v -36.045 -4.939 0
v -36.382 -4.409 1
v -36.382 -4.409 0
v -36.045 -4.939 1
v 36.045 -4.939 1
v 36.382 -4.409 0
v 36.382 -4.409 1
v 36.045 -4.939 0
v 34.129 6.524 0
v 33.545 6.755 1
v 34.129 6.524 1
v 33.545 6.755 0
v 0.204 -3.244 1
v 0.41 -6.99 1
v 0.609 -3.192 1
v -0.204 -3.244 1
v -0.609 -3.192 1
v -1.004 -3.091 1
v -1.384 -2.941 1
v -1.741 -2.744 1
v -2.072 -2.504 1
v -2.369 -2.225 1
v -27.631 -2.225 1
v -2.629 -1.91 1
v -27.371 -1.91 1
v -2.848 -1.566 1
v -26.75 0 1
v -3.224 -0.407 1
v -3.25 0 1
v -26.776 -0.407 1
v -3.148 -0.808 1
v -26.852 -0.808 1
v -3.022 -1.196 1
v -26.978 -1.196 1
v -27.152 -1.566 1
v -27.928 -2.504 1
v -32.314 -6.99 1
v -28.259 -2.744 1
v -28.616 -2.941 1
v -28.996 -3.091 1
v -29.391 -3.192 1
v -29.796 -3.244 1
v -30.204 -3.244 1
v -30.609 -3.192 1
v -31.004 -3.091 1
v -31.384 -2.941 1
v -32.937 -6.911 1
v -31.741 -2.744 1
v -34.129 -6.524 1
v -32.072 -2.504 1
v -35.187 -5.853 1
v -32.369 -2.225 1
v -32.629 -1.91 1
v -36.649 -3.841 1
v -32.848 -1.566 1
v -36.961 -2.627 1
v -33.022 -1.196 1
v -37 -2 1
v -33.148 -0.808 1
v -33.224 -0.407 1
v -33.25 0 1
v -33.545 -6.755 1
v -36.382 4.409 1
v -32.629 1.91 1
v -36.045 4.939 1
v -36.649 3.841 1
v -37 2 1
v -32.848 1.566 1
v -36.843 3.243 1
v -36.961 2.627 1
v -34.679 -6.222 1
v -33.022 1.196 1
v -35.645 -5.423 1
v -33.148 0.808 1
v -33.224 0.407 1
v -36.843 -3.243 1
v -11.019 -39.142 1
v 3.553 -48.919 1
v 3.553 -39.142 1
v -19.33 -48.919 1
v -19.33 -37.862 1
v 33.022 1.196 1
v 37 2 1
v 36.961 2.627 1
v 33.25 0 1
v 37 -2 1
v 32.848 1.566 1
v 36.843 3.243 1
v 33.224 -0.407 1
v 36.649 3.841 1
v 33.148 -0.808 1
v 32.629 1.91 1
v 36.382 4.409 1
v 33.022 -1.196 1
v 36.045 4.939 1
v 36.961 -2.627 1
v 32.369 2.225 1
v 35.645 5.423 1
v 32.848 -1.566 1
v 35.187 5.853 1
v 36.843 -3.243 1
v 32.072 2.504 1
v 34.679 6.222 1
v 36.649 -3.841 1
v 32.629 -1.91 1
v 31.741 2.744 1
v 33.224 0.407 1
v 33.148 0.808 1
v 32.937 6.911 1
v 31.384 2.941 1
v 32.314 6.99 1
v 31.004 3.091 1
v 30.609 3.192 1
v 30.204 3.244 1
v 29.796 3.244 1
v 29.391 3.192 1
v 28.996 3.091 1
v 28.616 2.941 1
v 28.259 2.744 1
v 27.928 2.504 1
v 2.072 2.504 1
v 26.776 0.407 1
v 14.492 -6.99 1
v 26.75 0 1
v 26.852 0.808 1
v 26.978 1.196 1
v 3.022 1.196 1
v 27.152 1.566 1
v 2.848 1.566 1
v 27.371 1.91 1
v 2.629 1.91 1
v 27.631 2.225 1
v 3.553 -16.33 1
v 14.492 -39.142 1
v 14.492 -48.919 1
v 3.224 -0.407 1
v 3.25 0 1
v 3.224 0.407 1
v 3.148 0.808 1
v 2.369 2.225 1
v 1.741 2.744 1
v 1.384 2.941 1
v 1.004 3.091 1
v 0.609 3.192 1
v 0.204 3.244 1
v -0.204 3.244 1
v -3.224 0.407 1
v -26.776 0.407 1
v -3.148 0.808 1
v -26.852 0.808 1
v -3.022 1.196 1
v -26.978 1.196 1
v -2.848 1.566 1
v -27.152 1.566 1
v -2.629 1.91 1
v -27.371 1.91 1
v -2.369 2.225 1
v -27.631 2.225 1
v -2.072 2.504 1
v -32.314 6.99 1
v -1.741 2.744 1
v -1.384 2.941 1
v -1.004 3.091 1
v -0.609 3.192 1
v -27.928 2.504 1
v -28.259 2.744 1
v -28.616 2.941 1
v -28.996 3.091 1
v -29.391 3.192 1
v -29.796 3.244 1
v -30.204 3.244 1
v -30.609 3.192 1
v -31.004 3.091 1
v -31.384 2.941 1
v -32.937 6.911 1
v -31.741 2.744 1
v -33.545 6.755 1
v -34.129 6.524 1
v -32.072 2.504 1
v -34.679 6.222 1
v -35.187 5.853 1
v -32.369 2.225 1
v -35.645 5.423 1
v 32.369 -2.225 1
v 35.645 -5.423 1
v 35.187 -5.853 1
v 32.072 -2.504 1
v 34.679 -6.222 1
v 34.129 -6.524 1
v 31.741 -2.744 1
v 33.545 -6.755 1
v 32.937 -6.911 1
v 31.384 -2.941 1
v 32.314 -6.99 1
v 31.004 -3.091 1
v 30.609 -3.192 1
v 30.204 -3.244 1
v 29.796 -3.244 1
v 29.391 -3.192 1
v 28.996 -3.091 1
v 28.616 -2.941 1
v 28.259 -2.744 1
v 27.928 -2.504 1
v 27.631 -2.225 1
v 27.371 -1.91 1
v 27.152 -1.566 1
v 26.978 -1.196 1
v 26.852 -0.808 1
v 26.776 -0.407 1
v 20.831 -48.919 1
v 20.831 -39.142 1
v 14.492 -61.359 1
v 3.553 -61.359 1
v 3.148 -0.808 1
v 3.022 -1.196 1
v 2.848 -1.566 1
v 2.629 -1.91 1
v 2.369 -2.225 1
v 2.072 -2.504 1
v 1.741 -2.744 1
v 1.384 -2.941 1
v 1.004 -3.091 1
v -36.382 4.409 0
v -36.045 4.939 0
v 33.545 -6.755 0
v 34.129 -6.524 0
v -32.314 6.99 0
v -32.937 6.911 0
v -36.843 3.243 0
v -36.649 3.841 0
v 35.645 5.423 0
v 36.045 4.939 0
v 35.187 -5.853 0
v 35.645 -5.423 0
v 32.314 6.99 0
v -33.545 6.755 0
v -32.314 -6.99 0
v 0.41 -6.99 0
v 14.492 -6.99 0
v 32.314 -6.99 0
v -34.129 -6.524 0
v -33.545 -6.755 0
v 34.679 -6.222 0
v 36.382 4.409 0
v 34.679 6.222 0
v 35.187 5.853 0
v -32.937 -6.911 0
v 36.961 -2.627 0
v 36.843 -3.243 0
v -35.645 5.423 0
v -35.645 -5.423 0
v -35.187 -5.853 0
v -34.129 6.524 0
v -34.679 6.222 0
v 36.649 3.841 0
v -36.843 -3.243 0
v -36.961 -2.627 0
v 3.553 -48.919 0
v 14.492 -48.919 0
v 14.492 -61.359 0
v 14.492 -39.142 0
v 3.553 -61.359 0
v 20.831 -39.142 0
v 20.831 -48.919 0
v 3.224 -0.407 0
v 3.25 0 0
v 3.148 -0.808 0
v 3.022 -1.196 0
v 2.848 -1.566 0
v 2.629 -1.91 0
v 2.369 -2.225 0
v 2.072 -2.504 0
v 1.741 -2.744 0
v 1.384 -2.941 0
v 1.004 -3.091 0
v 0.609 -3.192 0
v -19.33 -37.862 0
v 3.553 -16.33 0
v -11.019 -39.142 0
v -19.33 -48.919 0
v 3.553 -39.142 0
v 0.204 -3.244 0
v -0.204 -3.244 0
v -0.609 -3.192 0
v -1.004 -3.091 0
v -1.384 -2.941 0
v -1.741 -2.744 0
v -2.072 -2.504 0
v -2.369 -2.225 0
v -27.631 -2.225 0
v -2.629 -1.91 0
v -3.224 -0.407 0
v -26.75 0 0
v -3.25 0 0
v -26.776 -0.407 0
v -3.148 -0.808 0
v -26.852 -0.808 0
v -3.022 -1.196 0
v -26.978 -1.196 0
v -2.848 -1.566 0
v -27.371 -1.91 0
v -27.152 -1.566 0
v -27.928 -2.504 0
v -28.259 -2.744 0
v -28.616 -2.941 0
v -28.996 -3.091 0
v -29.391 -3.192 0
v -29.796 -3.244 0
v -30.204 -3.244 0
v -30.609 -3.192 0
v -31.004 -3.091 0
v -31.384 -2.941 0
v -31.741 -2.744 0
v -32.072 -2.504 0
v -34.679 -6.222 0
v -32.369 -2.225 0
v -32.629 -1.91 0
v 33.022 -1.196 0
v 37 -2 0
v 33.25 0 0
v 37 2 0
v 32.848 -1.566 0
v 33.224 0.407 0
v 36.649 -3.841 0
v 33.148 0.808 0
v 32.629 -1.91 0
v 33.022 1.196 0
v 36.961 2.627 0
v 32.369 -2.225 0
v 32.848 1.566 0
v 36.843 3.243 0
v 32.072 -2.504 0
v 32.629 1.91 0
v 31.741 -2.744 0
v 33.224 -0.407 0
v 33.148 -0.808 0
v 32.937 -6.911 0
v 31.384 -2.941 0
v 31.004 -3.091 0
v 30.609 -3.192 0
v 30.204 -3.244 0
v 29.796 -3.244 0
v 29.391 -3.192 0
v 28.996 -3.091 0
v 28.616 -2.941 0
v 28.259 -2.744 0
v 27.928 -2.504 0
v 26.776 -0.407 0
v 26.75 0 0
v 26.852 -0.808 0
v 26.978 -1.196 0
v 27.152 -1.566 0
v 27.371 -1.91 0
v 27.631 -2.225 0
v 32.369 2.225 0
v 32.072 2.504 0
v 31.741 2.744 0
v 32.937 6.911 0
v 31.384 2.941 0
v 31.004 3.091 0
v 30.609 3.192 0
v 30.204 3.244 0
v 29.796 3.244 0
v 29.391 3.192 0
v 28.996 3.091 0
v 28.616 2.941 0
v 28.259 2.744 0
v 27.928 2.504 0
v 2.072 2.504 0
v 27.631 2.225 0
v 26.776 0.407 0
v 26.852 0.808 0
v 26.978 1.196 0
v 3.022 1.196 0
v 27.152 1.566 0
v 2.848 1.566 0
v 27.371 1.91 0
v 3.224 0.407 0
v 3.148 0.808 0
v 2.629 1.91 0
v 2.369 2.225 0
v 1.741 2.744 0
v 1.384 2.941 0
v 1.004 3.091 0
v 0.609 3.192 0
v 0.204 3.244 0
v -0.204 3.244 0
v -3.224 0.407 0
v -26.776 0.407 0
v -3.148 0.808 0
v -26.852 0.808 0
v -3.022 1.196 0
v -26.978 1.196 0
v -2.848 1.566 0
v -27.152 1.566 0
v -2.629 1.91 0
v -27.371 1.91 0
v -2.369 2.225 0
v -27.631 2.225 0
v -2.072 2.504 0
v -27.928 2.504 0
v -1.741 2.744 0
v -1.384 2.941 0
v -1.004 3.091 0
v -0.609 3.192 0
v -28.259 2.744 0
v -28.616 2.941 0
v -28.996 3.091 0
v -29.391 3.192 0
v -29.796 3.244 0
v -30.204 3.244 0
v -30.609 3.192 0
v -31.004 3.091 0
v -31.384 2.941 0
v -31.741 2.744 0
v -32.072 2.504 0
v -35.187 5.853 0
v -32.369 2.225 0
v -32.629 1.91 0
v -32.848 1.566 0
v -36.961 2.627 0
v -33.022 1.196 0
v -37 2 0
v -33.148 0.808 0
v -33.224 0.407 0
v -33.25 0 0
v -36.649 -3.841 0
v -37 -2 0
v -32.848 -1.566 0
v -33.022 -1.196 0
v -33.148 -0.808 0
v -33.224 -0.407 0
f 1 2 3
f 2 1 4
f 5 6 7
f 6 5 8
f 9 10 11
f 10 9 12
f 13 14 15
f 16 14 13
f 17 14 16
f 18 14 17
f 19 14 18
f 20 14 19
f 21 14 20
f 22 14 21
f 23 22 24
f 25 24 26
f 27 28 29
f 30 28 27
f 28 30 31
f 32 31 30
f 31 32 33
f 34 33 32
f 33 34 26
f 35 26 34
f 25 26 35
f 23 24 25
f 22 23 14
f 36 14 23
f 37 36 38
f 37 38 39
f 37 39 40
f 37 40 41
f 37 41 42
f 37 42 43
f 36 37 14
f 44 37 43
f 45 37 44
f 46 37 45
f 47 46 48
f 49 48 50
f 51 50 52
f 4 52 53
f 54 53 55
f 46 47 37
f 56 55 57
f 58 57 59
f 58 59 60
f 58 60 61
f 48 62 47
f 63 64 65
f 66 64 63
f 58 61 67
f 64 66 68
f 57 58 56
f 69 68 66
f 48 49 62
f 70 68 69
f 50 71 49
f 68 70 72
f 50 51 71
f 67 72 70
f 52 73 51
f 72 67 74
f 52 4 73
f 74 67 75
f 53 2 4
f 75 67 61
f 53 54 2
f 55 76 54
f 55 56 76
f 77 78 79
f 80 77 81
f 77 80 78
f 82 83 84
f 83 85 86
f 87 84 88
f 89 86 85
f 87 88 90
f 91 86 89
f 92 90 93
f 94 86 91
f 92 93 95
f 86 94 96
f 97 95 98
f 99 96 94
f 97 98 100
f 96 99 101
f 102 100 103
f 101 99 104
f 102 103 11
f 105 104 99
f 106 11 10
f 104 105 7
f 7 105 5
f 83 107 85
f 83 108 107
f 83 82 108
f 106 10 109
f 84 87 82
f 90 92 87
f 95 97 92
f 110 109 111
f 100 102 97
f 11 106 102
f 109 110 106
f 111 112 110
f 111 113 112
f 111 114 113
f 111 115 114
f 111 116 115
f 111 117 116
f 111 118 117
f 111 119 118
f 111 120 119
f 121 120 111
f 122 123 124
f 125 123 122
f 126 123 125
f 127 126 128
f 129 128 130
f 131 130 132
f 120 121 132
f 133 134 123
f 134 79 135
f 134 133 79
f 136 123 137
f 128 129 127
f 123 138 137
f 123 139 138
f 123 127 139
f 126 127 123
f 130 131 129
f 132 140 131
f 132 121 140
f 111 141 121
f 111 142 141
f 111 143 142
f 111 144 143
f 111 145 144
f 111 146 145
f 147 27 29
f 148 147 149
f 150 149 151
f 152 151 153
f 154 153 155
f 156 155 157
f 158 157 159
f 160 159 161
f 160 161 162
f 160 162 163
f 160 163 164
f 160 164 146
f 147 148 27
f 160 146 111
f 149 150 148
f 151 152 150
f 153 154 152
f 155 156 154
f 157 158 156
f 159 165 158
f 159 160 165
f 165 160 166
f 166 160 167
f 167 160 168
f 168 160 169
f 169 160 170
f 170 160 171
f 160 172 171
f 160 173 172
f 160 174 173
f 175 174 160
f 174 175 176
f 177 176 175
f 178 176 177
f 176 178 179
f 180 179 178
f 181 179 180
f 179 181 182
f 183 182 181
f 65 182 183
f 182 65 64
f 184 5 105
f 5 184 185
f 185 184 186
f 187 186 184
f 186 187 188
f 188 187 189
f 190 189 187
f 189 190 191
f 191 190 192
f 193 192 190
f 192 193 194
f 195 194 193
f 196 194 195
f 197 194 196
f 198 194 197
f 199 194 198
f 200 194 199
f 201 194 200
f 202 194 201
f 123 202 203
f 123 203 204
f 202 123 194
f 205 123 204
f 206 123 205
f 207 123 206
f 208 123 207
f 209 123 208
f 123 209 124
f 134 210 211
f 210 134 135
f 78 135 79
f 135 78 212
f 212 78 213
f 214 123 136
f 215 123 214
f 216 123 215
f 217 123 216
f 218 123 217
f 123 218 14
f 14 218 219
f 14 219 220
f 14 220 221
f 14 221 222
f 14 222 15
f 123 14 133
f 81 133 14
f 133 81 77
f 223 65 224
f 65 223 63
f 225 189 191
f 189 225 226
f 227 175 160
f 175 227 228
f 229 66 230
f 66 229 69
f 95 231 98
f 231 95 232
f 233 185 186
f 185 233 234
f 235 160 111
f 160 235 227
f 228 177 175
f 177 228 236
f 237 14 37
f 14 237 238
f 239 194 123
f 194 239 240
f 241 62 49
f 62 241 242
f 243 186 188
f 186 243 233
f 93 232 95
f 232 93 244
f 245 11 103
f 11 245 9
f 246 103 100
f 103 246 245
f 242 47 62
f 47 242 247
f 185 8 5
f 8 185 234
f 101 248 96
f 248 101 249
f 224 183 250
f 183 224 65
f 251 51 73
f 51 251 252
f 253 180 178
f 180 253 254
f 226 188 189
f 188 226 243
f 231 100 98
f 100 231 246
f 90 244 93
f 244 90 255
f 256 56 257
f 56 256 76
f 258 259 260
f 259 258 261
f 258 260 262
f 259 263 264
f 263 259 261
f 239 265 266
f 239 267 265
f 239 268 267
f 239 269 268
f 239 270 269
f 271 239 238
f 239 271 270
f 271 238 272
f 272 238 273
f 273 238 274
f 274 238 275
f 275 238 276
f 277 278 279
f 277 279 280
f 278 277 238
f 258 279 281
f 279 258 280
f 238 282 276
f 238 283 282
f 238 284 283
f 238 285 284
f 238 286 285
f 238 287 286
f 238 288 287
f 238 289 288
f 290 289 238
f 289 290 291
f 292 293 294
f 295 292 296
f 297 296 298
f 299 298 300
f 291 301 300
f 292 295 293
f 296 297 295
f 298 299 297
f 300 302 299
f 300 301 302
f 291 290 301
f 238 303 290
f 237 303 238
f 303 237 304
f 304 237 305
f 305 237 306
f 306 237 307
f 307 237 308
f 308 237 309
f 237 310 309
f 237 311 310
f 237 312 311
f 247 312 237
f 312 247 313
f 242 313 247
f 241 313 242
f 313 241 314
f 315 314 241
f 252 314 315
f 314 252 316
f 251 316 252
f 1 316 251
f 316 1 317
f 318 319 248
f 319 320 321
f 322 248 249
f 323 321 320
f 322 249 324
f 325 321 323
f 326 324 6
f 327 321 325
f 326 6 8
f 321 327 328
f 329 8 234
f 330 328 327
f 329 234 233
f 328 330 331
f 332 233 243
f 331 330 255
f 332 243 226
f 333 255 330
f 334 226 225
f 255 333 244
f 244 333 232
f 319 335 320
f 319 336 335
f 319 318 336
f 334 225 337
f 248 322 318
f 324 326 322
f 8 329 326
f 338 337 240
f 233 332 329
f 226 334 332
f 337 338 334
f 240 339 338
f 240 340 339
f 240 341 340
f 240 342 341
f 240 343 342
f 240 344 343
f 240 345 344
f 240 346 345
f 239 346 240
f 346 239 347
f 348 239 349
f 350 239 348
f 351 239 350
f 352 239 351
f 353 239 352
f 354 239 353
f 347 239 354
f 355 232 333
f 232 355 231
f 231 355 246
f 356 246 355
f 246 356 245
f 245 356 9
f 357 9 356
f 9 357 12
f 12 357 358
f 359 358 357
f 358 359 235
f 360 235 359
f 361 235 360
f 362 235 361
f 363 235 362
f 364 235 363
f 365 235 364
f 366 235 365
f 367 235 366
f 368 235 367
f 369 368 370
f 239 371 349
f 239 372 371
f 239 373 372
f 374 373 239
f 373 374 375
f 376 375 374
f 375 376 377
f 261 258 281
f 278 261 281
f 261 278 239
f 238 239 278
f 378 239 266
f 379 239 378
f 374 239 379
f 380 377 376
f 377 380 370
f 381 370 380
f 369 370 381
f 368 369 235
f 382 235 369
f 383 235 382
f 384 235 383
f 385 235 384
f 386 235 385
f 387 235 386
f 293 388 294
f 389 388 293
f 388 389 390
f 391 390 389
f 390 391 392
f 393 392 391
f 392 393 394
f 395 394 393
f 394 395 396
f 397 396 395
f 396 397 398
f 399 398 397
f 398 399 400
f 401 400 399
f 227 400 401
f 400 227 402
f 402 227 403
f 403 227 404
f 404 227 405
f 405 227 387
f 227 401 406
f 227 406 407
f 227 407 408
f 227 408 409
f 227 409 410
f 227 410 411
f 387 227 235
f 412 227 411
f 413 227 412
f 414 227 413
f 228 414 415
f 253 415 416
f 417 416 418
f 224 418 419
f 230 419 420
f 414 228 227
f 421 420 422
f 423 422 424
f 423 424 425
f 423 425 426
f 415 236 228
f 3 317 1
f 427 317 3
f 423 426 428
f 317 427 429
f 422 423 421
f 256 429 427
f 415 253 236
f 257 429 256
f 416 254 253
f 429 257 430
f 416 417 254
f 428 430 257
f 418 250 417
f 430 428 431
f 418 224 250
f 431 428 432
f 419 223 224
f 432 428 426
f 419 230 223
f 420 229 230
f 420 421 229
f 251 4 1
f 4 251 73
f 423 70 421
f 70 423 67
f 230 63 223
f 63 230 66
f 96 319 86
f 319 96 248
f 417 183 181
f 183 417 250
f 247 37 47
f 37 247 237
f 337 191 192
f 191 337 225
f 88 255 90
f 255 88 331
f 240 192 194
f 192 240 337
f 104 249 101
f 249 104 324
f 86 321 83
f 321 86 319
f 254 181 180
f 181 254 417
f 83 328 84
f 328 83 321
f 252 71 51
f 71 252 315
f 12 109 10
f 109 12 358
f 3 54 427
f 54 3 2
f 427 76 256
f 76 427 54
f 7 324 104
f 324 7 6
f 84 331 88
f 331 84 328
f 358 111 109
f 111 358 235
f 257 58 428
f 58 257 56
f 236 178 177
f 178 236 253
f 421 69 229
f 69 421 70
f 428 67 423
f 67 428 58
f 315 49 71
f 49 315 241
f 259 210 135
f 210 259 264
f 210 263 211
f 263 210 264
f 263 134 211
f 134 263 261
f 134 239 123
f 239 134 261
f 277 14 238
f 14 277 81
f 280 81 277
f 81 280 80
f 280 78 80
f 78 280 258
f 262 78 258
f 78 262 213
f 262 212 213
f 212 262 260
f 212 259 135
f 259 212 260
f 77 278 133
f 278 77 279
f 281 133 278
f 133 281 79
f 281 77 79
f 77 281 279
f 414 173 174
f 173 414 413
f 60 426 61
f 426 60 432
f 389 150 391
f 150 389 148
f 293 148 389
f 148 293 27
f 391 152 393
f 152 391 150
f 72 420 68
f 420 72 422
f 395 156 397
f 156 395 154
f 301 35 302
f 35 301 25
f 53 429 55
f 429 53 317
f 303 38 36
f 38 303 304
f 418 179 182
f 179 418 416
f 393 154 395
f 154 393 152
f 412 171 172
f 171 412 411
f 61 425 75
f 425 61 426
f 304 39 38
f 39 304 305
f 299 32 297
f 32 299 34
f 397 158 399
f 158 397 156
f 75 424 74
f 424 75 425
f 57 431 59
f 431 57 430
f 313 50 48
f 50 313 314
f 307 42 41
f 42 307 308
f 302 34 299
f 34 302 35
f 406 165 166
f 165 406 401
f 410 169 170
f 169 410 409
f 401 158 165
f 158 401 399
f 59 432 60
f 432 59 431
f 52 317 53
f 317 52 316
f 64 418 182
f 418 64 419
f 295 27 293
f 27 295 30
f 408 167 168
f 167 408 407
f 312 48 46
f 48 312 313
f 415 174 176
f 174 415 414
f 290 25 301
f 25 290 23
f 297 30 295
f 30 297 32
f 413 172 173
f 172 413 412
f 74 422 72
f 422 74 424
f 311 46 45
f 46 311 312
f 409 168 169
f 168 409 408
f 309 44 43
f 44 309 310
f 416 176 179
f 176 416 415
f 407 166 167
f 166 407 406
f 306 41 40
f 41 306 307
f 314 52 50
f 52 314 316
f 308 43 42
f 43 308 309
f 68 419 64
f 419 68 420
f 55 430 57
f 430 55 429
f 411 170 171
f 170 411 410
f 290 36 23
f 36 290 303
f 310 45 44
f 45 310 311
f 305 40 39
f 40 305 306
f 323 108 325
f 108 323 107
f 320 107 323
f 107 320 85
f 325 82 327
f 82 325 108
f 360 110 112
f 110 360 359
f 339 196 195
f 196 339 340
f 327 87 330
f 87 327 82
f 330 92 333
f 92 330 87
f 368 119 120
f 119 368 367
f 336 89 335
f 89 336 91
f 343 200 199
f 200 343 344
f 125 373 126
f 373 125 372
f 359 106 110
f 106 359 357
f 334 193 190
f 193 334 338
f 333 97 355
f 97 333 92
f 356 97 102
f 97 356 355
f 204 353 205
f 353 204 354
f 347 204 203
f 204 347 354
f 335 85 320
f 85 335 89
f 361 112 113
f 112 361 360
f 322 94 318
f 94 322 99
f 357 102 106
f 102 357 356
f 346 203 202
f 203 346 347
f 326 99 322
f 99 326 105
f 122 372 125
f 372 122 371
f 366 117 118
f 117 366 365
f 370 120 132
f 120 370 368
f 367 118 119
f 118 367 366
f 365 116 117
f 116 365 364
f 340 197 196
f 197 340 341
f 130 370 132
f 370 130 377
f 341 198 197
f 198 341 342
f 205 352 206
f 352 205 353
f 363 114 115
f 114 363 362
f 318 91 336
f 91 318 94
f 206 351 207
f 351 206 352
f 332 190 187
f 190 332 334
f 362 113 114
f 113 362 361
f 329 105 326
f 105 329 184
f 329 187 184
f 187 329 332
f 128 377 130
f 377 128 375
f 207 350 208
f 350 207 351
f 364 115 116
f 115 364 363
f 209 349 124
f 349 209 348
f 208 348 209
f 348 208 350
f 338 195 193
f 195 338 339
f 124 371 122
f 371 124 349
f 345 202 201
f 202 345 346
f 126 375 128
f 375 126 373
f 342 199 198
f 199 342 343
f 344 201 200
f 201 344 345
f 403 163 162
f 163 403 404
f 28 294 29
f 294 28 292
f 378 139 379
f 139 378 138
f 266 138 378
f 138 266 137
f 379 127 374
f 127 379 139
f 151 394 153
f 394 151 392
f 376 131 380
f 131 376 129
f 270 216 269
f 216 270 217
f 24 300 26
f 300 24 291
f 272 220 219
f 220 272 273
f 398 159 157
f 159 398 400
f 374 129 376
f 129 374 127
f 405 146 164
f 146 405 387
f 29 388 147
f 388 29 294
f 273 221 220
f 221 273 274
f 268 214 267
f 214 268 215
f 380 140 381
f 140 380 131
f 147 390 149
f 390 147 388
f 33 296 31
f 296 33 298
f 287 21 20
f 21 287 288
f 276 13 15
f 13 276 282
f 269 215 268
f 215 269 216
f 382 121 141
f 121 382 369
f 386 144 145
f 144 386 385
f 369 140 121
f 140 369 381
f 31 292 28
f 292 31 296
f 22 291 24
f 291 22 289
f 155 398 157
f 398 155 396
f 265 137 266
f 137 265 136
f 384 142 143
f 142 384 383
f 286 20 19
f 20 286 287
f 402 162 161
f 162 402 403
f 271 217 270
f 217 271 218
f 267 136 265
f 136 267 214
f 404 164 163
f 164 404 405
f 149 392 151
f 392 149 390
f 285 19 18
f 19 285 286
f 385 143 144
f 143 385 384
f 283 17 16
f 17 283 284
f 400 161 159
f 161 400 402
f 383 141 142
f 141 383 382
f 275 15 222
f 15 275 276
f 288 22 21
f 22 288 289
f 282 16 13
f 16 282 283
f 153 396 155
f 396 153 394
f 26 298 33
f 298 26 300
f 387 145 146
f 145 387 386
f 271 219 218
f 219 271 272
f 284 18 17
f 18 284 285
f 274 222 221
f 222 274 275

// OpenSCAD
$fn = 50;


difference() {
	union() {
		translate(v = [0, 0, 0]) {
			rotate(a = [0, 0, 0]) {
				hull() {
					translate(v = [-32.0000000000, 2.0000000000, 0]) {
						rotate(a = [0, 0, 0]) {
							translate(v = [0, 0, 0]) {
								rotate(a = [0, 0, 0]) {
									cylinder(h = 1, r = 5);
								}
							}
						}
					}
					translate(v = [32.0000000000, 2.0000000000, 0]) {
						rotate(a = [0, 0, 0]) {
							translate(v = [0, 0, 0]) {
								rotate(a = [0, 0, 0]) {
									cylinder(h = 1, r = 5);
								}
							}
						}
					}
					translate(v = [-32.0000000000, -2.0000000000, 0]) {
						rotate(a = [0, 0, 0]) {
							translate(v = [0, 0, 0]) {
								rotate(a = [0, 0, 0]) {
									cylinder(h = 1, r = 5);
								}
							}
						}
					}
					translate(v = [32.0000000000, -2.0000000000, 0]) {
						rotate(a = [0, 0, 0]) {
							translate(v = [0, 0, 0]) {
								rotate(a = [0, 0, 0]) {
									cylinder(h = 1, r = 5);
								}
							}
						}
					}
				}
			}
		}
		translate(v = [0, -5, 0]) {
			rotate(a = [0, 0, 0]) {
				linear_extrude(height = 1) {
					text(font = "DejaVu Sans Mono:style=Bold", halign = "center", size = 57.0000000000, text = "4", valign = "top");
				}
			}
		}
	}
	union() {
		translate(v = [-30.0000000000, 0.0000000000, -125.0000000000]) {
			rotate(a = [0, 0, 0]) {
				cylinder(h = 250, r = 3.2500000000);
			}
		}
		translate(v = [30.0000000000, 0.0000000000, -125.0000000000]) {
			rotate(a = [0, 0, 0]) {
				cylinder(h = 250, r = 3.2500000000);
			}
		}
		translate(v = [30.0000000000, 0.0000000000, -125.0000000000]) {
			rotate(a = [0, 0, 0]) {
				cylinder(h = 250, r = 3.2500000000);
			}
		}
		translate(v = [0, 0, -125.0000000000]) {
			rotate(a = [0, 0, 0]) {
				cylinder(h = 250, r = 3.2500000000);
			}
		}
	}
}
